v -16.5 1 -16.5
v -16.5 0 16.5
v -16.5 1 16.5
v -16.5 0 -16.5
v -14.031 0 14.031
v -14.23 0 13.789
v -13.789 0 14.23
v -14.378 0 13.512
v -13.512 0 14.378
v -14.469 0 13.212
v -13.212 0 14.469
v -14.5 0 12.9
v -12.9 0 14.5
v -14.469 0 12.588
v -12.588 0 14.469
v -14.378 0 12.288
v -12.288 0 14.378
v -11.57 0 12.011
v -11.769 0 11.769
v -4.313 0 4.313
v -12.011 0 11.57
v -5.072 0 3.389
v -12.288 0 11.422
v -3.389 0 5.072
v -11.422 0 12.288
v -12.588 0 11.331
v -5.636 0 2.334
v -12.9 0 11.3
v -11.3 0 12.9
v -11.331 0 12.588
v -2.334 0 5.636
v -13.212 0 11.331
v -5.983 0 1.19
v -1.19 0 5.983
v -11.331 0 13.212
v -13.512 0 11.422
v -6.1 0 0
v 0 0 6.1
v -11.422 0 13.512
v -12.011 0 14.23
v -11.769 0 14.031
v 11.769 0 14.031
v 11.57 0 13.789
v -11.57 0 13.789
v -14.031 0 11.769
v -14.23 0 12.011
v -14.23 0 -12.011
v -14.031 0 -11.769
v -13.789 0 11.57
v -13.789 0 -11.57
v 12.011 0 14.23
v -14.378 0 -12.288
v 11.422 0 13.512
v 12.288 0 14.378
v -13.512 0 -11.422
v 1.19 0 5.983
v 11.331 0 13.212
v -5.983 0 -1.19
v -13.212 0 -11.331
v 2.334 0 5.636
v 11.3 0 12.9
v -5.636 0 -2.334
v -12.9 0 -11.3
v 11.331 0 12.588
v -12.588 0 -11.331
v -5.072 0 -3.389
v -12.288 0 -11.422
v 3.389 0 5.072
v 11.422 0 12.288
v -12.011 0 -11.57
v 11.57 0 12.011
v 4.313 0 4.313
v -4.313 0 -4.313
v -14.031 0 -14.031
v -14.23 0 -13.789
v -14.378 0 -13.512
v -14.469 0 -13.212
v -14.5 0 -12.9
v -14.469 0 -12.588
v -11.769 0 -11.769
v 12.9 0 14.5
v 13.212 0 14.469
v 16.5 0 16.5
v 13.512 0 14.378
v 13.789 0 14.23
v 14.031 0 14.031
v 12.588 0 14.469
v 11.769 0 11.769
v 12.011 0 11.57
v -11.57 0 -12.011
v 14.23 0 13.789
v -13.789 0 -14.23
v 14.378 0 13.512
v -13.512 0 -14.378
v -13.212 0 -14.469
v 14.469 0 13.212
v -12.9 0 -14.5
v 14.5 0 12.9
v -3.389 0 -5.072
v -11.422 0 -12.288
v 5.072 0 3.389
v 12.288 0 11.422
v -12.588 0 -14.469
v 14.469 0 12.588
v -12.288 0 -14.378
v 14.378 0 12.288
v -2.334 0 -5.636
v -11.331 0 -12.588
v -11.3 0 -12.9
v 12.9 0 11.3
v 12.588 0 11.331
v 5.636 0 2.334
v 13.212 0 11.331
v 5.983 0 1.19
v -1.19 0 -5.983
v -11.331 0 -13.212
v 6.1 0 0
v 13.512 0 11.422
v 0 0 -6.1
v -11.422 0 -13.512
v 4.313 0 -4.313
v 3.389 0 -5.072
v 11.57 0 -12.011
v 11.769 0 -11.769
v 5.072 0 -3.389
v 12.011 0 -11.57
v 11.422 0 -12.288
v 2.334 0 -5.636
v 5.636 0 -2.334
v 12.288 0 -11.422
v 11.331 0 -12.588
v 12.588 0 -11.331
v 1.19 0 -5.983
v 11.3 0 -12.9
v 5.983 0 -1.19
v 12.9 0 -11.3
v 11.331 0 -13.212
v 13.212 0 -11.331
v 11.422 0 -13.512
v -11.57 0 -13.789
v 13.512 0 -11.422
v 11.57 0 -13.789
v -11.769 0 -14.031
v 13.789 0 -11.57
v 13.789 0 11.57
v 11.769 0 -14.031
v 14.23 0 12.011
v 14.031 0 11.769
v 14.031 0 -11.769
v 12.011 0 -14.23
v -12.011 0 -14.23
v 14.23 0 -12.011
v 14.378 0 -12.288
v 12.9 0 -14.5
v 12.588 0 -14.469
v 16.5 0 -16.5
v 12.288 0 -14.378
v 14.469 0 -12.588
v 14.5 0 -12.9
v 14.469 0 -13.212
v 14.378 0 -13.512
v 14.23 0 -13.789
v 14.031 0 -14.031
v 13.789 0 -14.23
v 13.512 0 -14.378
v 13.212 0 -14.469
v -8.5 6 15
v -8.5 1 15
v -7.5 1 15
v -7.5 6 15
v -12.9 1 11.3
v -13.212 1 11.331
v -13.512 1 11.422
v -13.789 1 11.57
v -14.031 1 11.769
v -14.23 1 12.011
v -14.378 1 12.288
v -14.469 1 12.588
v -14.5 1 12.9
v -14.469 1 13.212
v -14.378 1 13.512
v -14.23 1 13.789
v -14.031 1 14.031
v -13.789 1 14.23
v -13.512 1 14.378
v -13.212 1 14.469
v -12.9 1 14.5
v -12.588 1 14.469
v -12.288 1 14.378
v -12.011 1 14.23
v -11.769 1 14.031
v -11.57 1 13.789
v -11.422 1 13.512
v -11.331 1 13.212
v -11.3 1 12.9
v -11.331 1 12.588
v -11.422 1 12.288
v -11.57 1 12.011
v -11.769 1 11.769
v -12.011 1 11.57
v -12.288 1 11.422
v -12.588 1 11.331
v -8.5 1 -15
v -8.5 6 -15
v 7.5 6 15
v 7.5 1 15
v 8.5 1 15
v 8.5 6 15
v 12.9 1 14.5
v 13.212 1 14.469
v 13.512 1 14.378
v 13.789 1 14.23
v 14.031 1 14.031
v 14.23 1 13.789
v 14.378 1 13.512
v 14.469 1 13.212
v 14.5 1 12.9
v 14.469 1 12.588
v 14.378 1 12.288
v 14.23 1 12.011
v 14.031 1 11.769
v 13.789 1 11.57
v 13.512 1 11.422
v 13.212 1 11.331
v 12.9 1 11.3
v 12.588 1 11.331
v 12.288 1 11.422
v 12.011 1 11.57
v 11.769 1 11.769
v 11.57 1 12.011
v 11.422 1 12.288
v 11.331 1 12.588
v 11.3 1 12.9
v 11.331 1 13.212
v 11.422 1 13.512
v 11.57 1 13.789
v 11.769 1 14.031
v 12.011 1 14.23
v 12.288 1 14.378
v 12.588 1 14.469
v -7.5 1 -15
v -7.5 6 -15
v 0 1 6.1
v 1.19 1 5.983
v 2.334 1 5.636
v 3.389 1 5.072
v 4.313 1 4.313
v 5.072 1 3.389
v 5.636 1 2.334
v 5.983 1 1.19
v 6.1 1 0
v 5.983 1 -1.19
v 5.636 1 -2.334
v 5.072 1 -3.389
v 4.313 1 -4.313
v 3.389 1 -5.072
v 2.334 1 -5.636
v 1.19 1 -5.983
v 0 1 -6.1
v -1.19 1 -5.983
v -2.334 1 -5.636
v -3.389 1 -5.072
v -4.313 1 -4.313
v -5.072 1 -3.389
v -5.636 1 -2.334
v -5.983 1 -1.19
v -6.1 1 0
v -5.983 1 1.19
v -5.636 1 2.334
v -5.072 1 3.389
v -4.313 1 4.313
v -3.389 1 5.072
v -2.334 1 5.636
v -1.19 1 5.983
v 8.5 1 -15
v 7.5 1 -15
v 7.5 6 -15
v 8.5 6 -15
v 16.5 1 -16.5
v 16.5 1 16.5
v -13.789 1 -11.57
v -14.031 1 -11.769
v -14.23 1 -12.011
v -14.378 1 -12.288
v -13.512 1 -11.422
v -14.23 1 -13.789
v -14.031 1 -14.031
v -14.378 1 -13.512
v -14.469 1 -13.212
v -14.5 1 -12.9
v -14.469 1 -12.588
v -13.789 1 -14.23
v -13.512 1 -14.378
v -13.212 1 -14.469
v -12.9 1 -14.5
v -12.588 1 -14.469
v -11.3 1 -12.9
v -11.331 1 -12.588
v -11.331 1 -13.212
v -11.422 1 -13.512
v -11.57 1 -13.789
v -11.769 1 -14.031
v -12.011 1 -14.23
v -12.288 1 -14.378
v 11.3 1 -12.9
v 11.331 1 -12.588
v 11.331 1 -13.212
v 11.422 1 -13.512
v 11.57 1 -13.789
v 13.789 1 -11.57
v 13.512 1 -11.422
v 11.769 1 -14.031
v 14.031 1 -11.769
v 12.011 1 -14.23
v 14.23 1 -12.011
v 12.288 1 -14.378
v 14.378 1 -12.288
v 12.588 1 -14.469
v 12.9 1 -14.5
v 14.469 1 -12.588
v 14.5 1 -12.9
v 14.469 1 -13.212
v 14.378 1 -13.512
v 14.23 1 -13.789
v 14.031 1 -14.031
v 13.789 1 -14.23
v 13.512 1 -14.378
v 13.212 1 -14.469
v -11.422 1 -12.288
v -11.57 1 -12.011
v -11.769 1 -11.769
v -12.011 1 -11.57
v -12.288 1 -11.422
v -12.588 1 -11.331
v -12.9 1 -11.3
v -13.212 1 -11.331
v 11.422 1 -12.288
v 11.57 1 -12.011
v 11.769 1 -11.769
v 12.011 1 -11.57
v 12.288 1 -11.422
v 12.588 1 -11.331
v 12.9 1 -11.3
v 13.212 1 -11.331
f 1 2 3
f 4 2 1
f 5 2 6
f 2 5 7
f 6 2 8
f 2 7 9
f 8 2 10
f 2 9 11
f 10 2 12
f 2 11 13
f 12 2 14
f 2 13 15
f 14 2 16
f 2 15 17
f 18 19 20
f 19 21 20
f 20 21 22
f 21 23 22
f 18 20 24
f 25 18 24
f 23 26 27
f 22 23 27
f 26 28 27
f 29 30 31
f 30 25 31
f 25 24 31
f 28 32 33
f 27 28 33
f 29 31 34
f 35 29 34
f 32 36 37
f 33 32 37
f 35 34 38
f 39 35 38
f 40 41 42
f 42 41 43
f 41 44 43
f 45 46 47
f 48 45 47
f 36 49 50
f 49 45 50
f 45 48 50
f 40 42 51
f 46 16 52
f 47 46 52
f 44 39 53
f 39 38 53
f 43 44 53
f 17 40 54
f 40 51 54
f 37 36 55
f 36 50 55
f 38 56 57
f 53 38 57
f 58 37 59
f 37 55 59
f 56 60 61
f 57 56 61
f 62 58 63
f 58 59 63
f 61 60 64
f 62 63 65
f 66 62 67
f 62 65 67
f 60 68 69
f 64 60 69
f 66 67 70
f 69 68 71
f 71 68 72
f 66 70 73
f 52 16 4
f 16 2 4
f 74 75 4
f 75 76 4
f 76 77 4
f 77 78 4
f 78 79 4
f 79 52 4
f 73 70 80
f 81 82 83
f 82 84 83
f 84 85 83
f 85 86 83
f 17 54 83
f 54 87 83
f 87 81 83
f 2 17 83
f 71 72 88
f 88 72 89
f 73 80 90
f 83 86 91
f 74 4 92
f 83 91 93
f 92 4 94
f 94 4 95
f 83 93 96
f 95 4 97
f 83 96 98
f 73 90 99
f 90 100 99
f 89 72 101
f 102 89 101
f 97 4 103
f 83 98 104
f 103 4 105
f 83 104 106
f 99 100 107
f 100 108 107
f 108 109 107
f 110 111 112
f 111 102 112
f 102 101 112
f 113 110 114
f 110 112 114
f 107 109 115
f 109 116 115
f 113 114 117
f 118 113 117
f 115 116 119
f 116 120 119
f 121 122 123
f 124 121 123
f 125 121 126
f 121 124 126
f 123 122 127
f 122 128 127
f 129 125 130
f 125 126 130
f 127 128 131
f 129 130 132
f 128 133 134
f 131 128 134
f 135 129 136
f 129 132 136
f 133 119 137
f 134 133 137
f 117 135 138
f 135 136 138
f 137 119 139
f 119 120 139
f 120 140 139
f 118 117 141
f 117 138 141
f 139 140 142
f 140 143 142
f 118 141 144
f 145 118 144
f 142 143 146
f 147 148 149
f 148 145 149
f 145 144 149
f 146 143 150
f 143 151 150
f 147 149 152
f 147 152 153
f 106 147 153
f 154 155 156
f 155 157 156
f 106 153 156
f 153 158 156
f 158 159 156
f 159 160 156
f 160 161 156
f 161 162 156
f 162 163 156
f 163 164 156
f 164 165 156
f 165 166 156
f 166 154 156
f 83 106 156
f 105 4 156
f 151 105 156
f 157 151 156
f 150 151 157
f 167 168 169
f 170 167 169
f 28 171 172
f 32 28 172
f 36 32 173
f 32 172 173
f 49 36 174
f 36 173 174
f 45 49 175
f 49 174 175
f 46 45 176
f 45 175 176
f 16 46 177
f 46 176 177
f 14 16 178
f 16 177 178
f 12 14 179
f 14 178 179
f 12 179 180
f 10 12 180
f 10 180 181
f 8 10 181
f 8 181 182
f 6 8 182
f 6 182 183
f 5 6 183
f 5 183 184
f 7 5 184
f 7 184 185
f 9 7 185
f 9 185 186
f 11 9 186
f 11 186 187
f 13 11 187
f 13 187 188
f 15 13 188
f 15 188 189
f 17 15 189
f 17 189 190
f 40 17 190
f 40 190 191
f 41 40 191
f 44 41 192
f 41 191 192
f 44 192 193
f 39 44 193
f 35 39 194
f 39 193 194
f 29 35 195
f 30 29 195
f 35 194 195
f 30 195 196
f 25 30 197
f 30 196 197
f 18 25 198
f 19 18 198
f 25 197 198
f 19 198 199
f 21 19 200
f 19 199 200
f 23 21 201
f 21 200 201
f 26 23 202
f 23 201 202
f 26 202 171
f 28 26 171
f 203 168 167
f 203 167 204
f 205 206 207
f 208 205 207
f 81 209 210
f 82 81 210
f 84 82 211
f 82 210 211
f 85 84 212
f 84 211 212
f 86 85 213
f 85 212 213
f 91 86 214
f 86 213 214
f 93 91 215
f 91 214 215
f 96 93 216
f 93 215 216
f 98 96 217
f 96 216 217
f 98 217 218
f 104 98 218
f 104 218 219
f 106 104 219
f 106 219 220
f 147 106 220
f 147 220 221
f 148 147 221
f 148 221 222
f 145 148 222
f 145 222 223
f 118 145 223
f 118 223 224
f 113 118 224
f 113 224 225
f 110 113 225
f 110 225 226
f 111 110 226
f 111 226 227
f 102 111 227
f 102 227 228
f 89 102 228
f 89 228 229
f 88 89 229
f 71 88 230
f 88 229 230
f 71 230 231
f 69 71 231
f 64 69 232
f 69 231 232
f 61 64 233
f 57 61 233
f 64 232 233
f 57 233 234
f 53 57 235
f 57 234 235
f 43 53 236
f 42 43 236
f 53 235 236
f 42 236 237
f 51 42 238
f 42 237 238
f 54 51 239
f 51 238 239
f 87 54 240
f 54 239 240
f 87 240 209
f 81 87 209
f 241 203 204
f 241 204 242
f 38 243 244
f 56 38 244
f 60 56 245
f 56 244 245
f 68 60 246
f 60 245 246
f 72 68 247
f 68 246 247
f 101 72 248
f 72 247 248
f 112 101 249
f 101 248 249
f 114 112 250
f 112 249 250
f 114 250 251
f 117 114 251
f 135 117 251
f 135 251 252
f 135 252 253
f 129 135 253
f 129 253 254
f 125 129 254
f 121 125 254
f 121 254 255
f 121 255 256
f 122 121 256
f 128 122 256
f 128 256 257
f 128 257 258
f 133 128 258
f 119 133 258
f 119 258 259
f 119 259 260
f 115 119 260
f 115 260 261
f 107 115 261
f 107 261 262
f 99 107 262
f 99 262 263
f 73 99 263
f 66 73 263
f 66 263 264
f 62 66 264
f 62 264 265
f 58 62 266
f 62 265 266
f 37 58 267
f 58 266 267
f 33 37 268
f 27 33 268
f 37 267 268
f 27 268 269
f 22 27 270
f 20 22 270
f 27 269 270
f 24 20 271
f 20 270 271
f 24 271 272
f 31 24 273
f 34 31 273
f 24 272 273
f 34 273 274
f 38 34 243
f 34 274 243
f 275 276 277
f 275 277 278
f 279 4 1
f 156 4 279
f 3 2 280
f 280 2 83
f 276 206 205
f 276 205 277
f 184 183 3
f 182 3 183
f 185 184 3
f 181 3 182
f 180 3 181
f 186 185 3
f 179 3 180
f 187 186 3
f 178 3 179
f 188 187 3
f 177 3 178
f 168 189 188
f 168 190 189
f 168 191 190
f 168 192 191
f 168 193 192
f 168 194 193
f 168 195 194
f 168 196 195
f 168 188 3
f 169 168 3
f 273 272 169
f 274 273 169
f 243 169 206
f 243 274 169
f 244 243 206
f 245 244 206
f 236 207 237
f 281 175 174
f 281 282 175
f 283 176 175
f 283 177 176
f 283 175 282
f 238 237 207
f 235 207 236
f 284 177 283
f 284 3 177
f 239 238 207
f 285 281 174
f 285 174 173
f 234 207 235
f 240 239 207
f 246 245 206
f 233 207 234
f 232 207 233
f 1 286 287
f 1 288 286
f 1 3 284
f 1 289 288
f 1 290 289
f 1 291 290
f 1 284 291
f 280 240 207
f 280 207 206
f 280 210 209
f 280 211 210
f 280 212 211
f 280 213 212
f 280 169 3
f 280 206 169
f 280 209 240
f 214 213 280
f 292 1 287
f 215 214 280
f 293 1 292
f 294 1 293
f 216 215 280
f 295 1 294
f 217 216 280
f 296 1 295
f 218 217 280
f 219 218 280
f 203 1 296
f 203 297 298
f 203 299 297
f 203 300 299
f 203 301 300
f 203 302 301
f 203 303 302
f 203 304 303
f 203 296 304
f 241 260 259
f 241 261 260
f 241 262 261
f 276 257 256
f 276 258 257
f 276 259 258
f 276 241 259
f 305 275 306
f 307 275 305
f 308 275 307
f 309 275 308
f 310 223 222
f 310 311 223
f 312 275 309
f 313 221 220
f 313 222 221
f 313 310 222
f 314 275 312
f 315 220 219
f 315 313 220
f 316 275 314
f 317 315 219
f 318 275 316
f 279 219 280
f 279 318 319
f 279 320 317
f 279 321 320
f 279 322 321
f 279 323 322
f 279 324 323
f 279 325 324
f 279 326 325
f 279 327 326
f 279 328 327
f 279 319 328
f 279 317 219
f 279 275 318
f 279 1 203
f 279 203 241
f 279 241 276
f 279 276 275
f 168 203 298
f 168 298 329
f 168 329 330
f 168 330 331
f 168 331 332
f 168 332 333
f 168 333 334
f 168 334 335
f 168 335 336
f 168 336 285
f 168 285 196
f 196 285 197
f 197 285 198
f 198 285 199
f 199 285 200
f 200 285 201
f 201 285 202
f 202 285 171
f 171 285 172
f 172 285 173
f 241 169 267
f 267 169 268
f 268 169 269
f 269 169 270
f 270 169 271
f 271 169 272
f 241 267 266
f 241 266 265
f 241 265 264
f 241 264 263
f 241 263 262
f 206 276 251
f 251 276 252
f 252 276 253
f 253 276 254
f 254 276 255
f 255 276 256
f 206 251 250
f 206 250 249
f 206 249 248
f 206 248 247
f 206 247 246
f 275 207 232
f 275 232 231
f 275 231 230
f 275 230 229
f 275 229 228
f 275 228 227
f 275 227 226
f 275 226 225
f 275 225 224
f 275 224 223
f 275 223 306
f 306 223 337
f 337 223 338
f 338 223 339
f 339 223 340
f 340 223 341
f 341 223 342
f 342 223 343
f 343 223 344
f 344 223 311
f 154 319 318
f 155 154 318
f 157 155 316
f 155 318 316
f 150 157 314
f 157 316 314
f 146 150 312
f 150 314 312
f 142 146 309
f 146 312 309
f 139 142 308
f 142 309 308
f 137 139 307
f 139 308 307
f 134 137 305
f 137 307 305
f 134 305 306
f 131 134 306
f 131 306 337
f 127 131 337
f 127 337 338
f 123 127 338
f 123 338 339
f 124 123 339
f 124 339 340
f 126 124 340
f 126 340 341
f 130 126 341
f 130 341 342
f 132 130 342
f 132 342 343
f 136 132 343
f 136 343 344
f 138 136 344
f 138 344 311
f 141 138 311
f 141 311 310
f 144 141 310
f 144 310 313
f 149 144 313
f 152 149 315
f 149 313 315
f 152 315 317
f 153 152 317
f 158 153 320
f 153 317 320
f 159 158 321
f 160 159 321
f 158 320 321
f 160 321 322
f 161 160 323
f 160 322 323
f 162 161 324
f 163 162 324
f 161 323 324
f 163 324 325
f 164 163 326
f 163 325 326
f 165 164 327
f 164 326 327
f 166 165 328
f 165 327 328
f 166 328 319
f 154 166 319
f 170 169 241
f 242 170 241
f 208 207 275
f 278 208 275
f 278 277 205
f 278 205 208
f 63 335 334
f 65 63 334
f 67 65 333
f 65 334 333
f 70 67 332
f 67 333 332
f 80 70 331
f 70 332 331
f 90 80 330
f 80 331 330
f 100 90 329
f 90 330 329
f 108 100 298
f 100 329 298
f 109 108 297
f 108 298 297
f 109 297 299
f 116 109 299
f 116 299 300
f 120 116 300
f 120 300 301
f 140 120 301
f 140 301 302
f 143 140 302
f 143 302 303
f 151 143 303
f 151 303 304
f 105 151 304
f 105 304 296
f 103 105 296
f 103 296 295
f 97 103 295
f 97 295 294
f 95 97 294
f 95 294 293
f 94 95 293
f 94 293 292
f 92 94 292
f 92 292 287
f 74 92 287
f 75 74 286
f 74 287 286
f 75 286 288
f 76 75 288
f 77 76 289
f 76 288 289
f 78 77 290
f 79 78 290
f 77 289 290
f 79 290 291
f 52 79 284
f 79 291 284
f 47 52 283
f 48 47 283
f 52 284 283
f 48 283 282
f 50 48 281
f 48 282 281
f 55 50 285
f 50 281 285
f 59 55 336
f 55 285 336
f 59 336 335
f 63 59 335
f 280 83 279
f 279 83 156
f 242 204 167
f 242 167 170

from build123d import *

# Parameters (mm, degrees)
SKETCH_1_W          = 33
SKETCH_1_H          = 33
EXTRUDE_1_DEPTH     = 1
SKETCH_2_R          = 6.1
SKETCH_2_R_2        = 1.6
CUT_EXTRUDE_1_DEPTH = 24.355941428
SKETCH_3_W          = 1
SKETCH_3_H          = 30
EXTRUDE_2_DEPTH     = 5


with BuildPart() as part:
    # 草图1 → 凸台-拉伸1 (new body)
    with BuildSketch(Plane(origin=(0, 0, 0), x_dir=(1, 0, 0), z_dir=(0, 1, 0))):
        Rectangle(SKETCH_1_W, SKETCH_1_H)
    extrude(amount=EXTRUDE_1_DEPTH)

    # 草图2 → 切除-拉伸1 (cut, through all)
    with BuildSketch(Plane(origin=(0, 1, 0), x_dir=(1, 0, 0), z_dir=(0, 1, 0))):
        with Locations(Location((0, 0, 0), (0, 0, 270))):
            Circle(SKETCH_2_R)
        with Locations(Location((-12.9, 12.9, 0), (0, 0, 270))):
            Circle(SKETCH_2_R_2)
        with Locations(Location((12.9, 12.9, 0), (0, 0, 90))):
            Circle(SKETCH_2_R_2)
        with Locations(Location((12.9, -12.9, 0), (0, 0, 270))):
            Circle(SKETCH_2_R_2)
        with Locations(Location((-12.9, -12.9, 0), (0, 0, 90))):
            Circle(SKETCH_2_R_2)
    extrude(amount=-CUT_EXTRUDE_1_DEPTH, mode=Mode.SUBTRACT)

    # 草图3 → 凸台-拉伸2 (add)
    with BuildSketch(Plane(origin=(0, 1, 0), x_dir=(1, 0, 0), z_dir=(0, 1, 0))):
        with Locations((-8, 0)):
            Rectangle(SKETCH_3_W, SKETCH_3_H)
        with Locations((8, 0)):
            Rectangle(SKETCH_3_W, SKETCH_3_H)
    extrude(amount=EXTRUDE_2_DEPTH)


solid = part.part
